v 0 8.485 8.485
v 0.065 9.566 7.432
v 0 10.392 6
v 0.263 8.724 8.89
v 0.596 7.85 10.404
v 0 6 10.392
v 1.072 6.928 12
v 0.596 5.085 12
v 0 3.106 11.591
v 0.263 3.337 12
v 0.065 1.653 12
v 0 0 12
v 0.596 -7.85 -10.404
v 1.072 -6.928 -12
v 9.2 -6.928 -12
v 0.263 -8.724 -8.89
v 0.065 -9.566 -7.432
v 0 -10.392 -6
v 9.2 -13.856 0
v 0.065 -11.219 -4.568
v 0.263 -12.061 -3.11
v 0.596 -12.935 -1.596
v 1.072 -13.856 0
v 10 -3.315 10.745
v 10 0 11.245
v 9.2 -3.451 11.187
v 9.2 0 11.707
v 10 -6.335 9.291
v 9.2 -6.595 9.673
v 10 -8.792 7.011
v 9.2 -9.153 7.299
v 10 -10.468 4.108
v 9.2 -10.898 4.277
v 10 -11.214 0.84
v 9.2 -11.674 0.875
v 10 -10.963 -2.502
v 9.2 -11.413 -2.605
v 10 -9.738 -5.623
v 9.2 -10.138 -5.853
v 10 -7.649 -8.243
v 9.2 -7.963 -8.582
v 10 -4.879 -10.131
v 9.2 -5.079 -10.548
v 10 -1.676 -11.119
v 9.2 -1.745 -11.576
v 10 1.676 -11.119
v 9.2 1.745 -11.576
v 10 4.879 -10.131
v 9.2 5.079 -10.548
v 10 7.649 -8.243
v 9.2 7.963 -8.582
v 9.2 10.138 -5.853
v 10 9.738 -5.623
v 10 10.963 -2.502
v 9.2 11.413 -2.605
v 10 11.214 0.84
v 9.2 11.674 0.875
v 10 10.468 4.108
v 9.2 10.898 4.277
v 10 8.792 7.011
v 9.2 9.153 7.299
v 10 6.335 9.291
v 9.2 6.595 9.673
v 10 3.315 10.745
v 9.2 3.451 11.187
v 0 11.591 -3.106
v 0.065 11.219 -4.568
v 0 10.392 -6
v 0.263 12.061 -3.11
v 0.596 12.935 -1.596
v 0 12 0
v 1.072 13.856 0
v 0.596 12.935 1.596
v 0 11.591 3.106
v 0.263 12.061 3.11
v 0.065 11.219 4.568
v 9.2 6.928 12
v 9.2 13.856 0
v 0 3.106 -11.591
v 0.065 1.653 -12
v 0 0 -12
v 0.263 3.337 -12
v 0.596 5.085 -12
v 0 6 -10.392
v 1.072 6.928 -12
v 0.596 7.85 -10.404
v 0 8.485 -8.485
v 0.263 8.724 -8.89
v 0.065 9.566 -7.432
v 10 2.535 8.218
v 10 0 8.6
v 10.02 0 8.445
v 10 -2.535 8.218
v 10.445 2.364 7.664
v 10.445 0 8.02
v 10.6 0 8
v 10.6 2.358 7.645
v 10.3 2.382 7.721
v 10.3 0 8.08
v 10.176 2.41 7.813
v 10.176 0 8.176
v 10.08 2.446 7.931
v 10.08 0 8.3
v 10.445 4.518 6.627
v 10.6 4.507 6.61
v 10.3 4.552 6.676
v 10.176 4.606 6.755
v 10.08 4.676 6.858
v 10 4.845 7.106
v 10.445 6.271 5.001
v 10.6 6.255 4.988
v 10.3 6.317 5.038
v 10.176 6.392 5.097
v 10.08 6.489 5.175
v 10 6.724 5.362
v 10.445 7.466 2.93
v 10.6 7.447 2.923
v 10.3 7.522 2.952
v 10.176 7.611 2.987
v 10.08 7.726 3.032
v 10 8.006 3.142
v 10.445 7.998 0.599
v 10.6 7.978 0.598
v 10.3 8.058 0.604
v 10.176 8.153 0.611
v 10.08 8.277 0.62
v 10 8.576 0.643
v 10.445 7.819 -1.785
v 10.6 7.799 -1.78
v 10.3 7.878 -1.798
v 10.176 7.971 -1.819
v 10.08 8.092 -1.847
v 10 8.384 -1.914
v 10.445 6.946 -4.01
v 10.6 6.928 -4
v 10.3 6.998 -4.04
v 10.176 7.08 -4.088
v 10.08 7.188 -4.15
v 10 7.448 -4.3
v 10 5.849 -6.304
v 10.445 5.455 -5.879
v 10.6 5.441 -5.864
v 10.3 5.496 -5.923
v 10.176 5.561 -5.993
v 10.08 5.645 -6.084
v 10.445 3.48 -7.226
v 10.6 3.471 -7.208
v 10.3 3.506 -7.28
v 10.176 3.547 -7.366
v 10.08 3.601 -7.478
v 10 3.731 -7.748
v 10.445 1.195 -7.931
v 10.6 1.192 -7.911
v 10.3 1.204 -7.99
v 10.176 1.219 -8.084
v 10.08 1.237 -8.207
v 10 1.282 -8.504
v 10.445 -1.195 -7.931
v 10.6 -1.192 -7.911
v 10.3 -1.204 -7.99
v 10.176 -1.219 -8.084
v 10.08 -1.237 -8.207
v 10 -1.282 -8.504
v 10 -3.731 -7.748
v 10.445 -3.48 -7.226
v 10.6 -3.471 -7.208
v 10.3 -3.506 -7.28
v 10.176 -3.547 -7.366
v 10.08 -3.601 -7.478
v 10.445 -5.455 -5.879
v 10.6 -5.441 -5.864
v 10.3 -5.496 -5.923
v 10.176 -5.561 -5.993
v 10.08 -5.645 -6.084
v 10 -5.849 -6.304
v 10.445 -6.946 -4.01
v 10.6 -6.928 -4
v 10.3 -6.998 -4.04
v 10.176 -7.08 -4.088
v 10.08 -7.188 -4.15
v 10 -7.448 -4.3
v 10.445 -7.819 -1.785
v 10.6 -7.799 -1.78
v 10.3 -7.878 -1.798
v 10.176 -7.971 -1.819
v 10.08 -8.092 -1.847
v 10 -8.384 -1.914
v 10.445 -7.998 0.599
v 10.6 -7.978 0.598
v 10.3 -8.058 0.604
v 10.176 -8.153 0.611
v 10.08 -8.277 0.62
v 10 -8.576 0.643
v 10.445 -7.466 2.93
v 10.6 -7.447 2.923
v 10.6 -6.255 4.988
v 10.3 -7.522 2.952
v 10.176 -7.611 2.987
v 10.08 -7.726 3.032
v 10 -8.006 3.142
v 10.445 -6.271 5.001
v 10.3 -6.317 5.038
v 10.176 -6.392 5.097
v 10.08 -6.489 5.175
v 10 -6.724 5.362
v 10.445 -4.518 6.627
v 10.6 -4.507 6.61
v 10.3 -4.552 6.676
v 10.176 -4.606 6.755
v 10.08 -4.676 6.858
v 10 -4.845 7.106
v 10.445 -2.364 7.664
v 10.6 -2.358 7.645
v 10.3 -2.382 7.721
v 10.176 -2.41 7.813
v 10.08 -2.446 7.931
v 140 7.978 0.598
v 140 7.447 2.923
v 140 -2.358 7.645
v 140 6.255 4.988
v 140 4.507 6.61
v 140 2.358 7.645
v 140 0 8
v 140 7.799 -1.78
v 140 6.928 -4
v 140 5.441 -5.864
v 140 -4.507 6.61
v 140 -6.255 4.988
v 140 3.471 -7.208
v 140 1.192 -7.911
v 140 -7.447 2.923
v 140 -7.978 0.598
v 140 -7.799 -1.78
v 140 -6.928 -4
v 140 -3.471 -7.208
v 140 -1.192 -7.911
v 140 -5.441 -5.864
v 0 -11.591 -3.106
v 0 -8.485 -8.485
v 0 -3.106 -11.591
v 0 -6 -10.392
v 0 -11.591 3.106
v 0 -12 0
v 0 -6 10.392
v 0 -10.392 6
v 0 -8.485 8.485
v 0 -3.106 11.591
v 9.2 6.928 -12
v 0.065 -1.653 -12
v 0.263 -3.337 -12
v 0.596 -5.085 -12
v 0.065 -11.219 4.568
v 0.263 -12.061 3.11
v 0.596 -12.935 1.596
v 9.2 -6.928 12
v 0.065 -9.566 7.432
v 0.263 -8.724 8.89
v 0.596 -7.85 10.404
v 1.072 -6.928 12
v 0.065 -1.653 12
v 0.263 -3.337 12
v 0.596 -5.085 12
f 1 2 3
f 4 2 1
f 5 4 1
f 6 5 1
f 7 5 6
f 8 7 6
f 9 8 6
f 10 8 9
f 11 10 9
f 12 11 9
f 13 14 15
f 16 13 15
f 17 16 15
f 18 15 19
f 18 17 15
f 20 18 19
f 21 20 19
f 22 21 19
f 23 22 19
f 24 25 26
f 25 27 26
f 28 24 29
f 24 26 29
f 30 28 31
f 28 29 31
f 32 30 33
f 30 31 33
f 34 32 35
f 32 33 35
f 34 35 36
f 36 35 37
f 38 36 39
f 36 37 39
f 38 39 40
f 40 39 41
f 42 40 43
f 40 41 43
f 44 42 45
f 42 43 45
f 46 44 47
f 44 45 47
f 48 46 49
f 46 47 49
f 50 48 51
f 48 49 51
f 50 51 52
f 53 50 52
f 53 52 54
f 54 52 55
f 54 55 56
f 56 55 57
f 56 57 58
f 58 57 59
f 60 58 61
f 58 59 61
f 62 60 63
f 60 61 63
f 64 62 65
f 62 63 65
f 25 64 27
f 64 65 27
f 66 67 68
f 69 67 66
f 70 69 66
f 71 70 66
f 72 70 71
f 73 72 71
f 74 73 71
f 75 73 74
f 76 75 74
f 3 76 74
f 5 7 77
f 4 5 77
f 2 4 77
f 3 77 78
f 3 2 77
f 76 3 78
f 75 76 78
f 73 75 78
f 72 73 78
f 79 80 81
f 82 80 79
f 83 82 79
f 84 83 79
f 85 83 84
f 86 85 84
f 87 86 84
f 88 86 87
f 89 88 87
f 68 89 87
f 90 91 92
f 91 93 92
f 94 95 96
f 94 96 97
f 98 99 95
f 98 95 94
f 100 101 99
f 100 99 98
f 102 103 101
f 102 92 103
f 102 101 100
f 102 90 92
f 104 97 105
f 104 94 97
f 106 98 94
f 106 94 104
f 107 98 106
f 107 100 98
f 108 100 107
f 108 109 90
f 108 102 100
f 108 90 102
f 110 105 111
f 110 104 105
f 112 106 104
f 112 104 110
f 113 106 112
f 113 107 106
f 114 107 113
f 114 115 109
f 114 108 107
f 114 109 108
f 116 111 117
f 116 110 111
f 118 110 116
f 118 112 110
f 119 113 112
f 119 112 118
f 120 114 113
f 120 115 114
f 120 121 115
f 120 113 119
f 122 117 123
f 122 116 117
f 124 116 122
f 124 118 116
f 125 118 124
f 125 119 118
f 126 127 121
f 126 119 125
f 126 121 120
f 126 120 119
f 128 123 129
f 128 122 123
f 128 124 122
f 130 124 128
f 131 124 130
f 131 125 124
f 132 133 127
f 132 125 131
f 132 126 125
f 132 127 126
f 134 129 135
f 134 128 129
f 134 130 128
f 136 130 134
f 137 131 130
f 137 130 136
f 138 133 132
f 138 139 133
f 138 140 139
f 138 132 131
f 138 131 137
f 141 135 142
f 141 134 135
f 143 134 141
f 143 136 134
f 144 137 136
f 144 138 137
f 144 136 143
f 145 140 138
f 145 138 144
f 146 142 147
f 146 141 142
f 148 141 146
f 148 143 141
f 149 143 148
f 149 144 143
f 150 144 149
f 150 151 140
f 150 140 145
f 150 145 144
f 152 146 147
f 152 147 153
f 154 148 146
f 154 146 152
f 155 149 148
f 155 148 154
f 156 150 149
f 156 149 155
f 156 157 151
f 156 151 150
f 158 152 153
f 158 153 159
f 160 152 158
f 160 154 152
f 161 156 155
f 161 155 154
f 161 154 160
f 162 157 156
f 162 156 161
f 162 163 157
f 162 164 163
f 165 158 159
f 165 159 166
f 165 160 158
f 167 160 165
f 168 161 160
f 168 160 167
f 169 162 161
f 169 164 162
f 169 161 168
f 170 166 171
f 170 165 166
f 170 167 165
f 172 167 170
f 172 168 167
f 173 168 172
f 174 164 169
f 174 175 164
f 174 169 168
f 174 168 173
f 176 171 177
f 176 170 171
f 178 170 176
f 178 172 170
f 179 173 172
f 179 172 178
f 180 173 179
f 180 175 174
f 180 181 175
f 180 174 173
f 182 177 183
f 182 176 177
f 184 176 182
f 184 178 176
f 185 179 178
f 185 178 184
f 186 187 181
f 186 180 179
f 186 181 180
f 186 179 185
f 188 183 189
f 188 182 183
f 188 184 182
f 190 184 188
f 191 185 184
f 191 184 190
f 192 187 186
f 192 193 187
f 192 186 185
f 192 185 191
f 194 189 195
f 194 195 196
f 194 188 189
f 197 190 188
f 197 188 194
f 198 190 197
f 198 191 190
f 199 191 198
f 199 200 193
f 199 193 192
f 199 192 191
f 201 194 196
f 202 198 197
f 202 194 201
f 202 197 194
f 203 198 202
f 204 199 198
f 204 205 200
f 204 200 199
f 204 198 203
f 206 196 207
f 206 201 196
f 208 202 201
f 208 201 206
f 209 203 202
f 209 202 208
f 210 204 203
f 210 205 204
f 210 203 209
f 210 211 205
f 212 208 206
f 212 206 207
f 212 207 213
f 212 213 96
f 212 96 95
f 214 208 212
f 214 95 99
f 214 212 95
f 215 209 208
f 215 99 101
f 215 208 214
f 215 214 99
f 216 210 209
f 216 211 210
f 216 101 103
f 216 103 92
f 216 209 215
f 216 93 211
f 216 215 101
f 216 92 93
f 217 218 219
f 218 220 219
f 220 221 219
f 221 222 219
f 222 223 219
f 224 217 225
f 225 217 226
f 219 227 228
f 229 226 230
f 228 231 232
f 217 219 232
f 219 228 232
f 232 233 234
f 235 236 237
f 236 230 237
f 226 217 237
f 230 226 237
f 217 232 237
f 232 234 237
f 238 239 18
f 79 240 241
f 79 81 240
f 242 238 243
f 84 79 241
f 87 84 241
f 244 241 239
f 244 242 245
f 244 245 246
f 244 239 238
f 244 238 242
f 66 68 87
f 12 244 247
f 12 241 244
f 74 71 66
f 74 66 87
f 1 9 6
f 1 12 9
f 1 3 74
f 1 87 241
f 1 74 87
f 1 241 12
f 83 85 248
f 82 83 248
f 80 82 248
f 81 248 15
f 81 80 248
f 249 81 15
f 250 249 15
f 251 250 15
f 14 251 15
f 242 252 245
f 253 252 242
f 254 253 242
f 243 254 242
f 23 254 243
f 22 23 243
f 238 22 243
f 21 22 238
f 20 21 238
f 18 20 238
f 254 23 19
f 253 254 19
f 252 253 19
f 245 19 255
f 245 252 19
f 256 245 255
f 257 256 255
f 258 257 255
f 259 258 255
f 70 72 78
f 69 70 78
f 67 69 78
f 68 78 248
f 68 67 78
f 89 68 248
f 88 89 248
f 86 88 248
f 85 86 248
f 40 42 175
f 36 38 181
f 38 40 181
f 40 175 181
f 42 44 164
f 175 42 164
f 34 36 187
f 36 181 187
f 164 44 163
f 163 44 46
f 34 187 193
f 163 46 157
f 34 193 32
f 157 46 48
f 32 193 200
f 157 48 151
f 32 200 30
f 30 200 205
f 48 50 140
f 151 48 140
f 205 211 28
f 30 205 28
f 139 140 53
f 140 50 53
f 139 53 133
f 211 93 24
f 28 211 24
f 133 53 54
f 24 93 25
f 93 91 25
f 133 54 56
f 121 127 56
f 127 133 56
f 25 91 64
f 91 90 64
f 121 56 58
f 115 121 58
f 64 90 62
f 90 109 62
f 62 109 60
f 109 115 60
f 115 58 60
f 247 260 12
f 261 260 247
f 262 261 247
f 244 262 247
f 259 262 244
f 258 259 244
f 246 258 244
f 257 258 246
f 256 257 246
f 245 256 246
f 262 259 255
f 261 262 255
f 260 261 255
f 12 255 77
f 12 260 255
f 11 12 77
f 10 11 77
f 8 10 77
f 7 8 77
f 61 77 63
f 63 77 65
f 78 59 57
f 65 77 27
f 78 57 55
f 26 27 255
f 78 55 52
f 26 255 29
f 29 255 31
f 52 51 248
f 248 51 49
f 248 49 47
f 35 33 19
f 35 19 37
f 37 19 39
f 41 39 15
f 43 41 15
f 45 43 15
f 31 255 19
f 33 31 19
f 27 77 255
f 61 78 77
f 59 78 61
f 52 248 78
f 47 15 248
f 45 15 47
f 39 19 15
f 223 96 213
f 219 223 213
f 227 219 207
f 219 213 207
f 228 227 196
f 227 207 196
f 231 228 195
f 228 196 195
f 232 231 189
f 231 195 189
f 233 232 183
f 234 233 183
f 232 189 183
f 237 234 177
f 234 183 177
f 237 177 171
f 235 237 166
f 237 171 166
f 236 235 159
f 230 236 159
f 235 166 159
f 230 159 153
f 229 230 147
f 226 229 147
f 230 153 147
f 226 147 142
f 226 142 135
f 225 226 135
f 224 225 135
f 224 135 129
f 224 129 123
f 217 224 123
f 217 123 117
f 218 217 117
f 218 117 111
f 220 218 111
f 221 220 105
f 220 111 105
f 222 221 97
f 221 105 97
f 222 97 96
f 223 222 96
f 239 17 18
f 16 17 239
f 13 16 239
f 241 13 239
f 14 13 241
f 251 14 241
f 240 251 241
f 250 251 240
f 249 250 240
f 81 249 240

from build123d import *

# Parameters (mm, degrees)
EXTRUDE_390_DEPTH = 10
FILLET_1283_R     = 0.6


with BuildPart() as part:
    # 草图1 → Extrude 390 (new body)
    with BuildSketch(Plane(origin=(0, 0, 0), x_dir=(0, 0, -1), z_dir=(1, 0, 0))):
        Polygon((12, 6.92820323), (12, -6.92820323), (0, -13.856406461), (-12, -6.92820323), (-12, 6.92820323), (0, 13.856406461), align=None)
    extrude(amount=EXTRUDE_390_DEPTH)

    # 草图2 → 凸台-旋转1 (revolve)
    with BuildSketch(Plane.XY, mode=Mode.PRIVATE) as revolve_1_sk:
        Polygon((0, 0), (140, 0), (140, 6.268), (140, 8), (96, 8), (0, 8), align=None)
    revolve(revolve_1_sk.sketch.rotate(Axis((0, 0, 0), (1, 0, 0)), 90), axis=Axis((0, 0, 0), (1, 0, 0)))

    # 草图3 → 切除-旋转1 (revolve, cut)
    with BuildSketch(Plane.XY):
        Polygon((0, 12), (3.958548116, 18.856406461), (3.958548116, 23.856406461), (-10, 23.856406461), (-10, 12), align=None)
    revolve(axis=Axis((0, 0, 0), (1, 0, 0)), mode=Mode.SUBTRACT)

    # 草图4 → 切除-旋转3 (revolve, cut)
    with BuildSketch(Plane.XY, mode=Mode.PRIVATE) as cut_revolve_3_sk:
        Polygon((10, 11.245), (9.2, 11.706880215), (9.2, 13.856406461), (10, 13.856406461), align=None)
    revolve(cut_revolve_3_sk.sketch.rotate(Axis((0, 0, 0), (1, 0, 0)), 90), axis=Axis((0, 0, 0), (1, 0, 0)), mode=Mode.SUBTRACT)

    # Fillet 1283
    fillet_1283_edges = [part.edges().sort_by_distance(p)[0] for p in [
        (10, 0, -8),
    ]]
    fillet(fillet_1283_edges, radius=FILLET_1283_R)


solid = part.part
